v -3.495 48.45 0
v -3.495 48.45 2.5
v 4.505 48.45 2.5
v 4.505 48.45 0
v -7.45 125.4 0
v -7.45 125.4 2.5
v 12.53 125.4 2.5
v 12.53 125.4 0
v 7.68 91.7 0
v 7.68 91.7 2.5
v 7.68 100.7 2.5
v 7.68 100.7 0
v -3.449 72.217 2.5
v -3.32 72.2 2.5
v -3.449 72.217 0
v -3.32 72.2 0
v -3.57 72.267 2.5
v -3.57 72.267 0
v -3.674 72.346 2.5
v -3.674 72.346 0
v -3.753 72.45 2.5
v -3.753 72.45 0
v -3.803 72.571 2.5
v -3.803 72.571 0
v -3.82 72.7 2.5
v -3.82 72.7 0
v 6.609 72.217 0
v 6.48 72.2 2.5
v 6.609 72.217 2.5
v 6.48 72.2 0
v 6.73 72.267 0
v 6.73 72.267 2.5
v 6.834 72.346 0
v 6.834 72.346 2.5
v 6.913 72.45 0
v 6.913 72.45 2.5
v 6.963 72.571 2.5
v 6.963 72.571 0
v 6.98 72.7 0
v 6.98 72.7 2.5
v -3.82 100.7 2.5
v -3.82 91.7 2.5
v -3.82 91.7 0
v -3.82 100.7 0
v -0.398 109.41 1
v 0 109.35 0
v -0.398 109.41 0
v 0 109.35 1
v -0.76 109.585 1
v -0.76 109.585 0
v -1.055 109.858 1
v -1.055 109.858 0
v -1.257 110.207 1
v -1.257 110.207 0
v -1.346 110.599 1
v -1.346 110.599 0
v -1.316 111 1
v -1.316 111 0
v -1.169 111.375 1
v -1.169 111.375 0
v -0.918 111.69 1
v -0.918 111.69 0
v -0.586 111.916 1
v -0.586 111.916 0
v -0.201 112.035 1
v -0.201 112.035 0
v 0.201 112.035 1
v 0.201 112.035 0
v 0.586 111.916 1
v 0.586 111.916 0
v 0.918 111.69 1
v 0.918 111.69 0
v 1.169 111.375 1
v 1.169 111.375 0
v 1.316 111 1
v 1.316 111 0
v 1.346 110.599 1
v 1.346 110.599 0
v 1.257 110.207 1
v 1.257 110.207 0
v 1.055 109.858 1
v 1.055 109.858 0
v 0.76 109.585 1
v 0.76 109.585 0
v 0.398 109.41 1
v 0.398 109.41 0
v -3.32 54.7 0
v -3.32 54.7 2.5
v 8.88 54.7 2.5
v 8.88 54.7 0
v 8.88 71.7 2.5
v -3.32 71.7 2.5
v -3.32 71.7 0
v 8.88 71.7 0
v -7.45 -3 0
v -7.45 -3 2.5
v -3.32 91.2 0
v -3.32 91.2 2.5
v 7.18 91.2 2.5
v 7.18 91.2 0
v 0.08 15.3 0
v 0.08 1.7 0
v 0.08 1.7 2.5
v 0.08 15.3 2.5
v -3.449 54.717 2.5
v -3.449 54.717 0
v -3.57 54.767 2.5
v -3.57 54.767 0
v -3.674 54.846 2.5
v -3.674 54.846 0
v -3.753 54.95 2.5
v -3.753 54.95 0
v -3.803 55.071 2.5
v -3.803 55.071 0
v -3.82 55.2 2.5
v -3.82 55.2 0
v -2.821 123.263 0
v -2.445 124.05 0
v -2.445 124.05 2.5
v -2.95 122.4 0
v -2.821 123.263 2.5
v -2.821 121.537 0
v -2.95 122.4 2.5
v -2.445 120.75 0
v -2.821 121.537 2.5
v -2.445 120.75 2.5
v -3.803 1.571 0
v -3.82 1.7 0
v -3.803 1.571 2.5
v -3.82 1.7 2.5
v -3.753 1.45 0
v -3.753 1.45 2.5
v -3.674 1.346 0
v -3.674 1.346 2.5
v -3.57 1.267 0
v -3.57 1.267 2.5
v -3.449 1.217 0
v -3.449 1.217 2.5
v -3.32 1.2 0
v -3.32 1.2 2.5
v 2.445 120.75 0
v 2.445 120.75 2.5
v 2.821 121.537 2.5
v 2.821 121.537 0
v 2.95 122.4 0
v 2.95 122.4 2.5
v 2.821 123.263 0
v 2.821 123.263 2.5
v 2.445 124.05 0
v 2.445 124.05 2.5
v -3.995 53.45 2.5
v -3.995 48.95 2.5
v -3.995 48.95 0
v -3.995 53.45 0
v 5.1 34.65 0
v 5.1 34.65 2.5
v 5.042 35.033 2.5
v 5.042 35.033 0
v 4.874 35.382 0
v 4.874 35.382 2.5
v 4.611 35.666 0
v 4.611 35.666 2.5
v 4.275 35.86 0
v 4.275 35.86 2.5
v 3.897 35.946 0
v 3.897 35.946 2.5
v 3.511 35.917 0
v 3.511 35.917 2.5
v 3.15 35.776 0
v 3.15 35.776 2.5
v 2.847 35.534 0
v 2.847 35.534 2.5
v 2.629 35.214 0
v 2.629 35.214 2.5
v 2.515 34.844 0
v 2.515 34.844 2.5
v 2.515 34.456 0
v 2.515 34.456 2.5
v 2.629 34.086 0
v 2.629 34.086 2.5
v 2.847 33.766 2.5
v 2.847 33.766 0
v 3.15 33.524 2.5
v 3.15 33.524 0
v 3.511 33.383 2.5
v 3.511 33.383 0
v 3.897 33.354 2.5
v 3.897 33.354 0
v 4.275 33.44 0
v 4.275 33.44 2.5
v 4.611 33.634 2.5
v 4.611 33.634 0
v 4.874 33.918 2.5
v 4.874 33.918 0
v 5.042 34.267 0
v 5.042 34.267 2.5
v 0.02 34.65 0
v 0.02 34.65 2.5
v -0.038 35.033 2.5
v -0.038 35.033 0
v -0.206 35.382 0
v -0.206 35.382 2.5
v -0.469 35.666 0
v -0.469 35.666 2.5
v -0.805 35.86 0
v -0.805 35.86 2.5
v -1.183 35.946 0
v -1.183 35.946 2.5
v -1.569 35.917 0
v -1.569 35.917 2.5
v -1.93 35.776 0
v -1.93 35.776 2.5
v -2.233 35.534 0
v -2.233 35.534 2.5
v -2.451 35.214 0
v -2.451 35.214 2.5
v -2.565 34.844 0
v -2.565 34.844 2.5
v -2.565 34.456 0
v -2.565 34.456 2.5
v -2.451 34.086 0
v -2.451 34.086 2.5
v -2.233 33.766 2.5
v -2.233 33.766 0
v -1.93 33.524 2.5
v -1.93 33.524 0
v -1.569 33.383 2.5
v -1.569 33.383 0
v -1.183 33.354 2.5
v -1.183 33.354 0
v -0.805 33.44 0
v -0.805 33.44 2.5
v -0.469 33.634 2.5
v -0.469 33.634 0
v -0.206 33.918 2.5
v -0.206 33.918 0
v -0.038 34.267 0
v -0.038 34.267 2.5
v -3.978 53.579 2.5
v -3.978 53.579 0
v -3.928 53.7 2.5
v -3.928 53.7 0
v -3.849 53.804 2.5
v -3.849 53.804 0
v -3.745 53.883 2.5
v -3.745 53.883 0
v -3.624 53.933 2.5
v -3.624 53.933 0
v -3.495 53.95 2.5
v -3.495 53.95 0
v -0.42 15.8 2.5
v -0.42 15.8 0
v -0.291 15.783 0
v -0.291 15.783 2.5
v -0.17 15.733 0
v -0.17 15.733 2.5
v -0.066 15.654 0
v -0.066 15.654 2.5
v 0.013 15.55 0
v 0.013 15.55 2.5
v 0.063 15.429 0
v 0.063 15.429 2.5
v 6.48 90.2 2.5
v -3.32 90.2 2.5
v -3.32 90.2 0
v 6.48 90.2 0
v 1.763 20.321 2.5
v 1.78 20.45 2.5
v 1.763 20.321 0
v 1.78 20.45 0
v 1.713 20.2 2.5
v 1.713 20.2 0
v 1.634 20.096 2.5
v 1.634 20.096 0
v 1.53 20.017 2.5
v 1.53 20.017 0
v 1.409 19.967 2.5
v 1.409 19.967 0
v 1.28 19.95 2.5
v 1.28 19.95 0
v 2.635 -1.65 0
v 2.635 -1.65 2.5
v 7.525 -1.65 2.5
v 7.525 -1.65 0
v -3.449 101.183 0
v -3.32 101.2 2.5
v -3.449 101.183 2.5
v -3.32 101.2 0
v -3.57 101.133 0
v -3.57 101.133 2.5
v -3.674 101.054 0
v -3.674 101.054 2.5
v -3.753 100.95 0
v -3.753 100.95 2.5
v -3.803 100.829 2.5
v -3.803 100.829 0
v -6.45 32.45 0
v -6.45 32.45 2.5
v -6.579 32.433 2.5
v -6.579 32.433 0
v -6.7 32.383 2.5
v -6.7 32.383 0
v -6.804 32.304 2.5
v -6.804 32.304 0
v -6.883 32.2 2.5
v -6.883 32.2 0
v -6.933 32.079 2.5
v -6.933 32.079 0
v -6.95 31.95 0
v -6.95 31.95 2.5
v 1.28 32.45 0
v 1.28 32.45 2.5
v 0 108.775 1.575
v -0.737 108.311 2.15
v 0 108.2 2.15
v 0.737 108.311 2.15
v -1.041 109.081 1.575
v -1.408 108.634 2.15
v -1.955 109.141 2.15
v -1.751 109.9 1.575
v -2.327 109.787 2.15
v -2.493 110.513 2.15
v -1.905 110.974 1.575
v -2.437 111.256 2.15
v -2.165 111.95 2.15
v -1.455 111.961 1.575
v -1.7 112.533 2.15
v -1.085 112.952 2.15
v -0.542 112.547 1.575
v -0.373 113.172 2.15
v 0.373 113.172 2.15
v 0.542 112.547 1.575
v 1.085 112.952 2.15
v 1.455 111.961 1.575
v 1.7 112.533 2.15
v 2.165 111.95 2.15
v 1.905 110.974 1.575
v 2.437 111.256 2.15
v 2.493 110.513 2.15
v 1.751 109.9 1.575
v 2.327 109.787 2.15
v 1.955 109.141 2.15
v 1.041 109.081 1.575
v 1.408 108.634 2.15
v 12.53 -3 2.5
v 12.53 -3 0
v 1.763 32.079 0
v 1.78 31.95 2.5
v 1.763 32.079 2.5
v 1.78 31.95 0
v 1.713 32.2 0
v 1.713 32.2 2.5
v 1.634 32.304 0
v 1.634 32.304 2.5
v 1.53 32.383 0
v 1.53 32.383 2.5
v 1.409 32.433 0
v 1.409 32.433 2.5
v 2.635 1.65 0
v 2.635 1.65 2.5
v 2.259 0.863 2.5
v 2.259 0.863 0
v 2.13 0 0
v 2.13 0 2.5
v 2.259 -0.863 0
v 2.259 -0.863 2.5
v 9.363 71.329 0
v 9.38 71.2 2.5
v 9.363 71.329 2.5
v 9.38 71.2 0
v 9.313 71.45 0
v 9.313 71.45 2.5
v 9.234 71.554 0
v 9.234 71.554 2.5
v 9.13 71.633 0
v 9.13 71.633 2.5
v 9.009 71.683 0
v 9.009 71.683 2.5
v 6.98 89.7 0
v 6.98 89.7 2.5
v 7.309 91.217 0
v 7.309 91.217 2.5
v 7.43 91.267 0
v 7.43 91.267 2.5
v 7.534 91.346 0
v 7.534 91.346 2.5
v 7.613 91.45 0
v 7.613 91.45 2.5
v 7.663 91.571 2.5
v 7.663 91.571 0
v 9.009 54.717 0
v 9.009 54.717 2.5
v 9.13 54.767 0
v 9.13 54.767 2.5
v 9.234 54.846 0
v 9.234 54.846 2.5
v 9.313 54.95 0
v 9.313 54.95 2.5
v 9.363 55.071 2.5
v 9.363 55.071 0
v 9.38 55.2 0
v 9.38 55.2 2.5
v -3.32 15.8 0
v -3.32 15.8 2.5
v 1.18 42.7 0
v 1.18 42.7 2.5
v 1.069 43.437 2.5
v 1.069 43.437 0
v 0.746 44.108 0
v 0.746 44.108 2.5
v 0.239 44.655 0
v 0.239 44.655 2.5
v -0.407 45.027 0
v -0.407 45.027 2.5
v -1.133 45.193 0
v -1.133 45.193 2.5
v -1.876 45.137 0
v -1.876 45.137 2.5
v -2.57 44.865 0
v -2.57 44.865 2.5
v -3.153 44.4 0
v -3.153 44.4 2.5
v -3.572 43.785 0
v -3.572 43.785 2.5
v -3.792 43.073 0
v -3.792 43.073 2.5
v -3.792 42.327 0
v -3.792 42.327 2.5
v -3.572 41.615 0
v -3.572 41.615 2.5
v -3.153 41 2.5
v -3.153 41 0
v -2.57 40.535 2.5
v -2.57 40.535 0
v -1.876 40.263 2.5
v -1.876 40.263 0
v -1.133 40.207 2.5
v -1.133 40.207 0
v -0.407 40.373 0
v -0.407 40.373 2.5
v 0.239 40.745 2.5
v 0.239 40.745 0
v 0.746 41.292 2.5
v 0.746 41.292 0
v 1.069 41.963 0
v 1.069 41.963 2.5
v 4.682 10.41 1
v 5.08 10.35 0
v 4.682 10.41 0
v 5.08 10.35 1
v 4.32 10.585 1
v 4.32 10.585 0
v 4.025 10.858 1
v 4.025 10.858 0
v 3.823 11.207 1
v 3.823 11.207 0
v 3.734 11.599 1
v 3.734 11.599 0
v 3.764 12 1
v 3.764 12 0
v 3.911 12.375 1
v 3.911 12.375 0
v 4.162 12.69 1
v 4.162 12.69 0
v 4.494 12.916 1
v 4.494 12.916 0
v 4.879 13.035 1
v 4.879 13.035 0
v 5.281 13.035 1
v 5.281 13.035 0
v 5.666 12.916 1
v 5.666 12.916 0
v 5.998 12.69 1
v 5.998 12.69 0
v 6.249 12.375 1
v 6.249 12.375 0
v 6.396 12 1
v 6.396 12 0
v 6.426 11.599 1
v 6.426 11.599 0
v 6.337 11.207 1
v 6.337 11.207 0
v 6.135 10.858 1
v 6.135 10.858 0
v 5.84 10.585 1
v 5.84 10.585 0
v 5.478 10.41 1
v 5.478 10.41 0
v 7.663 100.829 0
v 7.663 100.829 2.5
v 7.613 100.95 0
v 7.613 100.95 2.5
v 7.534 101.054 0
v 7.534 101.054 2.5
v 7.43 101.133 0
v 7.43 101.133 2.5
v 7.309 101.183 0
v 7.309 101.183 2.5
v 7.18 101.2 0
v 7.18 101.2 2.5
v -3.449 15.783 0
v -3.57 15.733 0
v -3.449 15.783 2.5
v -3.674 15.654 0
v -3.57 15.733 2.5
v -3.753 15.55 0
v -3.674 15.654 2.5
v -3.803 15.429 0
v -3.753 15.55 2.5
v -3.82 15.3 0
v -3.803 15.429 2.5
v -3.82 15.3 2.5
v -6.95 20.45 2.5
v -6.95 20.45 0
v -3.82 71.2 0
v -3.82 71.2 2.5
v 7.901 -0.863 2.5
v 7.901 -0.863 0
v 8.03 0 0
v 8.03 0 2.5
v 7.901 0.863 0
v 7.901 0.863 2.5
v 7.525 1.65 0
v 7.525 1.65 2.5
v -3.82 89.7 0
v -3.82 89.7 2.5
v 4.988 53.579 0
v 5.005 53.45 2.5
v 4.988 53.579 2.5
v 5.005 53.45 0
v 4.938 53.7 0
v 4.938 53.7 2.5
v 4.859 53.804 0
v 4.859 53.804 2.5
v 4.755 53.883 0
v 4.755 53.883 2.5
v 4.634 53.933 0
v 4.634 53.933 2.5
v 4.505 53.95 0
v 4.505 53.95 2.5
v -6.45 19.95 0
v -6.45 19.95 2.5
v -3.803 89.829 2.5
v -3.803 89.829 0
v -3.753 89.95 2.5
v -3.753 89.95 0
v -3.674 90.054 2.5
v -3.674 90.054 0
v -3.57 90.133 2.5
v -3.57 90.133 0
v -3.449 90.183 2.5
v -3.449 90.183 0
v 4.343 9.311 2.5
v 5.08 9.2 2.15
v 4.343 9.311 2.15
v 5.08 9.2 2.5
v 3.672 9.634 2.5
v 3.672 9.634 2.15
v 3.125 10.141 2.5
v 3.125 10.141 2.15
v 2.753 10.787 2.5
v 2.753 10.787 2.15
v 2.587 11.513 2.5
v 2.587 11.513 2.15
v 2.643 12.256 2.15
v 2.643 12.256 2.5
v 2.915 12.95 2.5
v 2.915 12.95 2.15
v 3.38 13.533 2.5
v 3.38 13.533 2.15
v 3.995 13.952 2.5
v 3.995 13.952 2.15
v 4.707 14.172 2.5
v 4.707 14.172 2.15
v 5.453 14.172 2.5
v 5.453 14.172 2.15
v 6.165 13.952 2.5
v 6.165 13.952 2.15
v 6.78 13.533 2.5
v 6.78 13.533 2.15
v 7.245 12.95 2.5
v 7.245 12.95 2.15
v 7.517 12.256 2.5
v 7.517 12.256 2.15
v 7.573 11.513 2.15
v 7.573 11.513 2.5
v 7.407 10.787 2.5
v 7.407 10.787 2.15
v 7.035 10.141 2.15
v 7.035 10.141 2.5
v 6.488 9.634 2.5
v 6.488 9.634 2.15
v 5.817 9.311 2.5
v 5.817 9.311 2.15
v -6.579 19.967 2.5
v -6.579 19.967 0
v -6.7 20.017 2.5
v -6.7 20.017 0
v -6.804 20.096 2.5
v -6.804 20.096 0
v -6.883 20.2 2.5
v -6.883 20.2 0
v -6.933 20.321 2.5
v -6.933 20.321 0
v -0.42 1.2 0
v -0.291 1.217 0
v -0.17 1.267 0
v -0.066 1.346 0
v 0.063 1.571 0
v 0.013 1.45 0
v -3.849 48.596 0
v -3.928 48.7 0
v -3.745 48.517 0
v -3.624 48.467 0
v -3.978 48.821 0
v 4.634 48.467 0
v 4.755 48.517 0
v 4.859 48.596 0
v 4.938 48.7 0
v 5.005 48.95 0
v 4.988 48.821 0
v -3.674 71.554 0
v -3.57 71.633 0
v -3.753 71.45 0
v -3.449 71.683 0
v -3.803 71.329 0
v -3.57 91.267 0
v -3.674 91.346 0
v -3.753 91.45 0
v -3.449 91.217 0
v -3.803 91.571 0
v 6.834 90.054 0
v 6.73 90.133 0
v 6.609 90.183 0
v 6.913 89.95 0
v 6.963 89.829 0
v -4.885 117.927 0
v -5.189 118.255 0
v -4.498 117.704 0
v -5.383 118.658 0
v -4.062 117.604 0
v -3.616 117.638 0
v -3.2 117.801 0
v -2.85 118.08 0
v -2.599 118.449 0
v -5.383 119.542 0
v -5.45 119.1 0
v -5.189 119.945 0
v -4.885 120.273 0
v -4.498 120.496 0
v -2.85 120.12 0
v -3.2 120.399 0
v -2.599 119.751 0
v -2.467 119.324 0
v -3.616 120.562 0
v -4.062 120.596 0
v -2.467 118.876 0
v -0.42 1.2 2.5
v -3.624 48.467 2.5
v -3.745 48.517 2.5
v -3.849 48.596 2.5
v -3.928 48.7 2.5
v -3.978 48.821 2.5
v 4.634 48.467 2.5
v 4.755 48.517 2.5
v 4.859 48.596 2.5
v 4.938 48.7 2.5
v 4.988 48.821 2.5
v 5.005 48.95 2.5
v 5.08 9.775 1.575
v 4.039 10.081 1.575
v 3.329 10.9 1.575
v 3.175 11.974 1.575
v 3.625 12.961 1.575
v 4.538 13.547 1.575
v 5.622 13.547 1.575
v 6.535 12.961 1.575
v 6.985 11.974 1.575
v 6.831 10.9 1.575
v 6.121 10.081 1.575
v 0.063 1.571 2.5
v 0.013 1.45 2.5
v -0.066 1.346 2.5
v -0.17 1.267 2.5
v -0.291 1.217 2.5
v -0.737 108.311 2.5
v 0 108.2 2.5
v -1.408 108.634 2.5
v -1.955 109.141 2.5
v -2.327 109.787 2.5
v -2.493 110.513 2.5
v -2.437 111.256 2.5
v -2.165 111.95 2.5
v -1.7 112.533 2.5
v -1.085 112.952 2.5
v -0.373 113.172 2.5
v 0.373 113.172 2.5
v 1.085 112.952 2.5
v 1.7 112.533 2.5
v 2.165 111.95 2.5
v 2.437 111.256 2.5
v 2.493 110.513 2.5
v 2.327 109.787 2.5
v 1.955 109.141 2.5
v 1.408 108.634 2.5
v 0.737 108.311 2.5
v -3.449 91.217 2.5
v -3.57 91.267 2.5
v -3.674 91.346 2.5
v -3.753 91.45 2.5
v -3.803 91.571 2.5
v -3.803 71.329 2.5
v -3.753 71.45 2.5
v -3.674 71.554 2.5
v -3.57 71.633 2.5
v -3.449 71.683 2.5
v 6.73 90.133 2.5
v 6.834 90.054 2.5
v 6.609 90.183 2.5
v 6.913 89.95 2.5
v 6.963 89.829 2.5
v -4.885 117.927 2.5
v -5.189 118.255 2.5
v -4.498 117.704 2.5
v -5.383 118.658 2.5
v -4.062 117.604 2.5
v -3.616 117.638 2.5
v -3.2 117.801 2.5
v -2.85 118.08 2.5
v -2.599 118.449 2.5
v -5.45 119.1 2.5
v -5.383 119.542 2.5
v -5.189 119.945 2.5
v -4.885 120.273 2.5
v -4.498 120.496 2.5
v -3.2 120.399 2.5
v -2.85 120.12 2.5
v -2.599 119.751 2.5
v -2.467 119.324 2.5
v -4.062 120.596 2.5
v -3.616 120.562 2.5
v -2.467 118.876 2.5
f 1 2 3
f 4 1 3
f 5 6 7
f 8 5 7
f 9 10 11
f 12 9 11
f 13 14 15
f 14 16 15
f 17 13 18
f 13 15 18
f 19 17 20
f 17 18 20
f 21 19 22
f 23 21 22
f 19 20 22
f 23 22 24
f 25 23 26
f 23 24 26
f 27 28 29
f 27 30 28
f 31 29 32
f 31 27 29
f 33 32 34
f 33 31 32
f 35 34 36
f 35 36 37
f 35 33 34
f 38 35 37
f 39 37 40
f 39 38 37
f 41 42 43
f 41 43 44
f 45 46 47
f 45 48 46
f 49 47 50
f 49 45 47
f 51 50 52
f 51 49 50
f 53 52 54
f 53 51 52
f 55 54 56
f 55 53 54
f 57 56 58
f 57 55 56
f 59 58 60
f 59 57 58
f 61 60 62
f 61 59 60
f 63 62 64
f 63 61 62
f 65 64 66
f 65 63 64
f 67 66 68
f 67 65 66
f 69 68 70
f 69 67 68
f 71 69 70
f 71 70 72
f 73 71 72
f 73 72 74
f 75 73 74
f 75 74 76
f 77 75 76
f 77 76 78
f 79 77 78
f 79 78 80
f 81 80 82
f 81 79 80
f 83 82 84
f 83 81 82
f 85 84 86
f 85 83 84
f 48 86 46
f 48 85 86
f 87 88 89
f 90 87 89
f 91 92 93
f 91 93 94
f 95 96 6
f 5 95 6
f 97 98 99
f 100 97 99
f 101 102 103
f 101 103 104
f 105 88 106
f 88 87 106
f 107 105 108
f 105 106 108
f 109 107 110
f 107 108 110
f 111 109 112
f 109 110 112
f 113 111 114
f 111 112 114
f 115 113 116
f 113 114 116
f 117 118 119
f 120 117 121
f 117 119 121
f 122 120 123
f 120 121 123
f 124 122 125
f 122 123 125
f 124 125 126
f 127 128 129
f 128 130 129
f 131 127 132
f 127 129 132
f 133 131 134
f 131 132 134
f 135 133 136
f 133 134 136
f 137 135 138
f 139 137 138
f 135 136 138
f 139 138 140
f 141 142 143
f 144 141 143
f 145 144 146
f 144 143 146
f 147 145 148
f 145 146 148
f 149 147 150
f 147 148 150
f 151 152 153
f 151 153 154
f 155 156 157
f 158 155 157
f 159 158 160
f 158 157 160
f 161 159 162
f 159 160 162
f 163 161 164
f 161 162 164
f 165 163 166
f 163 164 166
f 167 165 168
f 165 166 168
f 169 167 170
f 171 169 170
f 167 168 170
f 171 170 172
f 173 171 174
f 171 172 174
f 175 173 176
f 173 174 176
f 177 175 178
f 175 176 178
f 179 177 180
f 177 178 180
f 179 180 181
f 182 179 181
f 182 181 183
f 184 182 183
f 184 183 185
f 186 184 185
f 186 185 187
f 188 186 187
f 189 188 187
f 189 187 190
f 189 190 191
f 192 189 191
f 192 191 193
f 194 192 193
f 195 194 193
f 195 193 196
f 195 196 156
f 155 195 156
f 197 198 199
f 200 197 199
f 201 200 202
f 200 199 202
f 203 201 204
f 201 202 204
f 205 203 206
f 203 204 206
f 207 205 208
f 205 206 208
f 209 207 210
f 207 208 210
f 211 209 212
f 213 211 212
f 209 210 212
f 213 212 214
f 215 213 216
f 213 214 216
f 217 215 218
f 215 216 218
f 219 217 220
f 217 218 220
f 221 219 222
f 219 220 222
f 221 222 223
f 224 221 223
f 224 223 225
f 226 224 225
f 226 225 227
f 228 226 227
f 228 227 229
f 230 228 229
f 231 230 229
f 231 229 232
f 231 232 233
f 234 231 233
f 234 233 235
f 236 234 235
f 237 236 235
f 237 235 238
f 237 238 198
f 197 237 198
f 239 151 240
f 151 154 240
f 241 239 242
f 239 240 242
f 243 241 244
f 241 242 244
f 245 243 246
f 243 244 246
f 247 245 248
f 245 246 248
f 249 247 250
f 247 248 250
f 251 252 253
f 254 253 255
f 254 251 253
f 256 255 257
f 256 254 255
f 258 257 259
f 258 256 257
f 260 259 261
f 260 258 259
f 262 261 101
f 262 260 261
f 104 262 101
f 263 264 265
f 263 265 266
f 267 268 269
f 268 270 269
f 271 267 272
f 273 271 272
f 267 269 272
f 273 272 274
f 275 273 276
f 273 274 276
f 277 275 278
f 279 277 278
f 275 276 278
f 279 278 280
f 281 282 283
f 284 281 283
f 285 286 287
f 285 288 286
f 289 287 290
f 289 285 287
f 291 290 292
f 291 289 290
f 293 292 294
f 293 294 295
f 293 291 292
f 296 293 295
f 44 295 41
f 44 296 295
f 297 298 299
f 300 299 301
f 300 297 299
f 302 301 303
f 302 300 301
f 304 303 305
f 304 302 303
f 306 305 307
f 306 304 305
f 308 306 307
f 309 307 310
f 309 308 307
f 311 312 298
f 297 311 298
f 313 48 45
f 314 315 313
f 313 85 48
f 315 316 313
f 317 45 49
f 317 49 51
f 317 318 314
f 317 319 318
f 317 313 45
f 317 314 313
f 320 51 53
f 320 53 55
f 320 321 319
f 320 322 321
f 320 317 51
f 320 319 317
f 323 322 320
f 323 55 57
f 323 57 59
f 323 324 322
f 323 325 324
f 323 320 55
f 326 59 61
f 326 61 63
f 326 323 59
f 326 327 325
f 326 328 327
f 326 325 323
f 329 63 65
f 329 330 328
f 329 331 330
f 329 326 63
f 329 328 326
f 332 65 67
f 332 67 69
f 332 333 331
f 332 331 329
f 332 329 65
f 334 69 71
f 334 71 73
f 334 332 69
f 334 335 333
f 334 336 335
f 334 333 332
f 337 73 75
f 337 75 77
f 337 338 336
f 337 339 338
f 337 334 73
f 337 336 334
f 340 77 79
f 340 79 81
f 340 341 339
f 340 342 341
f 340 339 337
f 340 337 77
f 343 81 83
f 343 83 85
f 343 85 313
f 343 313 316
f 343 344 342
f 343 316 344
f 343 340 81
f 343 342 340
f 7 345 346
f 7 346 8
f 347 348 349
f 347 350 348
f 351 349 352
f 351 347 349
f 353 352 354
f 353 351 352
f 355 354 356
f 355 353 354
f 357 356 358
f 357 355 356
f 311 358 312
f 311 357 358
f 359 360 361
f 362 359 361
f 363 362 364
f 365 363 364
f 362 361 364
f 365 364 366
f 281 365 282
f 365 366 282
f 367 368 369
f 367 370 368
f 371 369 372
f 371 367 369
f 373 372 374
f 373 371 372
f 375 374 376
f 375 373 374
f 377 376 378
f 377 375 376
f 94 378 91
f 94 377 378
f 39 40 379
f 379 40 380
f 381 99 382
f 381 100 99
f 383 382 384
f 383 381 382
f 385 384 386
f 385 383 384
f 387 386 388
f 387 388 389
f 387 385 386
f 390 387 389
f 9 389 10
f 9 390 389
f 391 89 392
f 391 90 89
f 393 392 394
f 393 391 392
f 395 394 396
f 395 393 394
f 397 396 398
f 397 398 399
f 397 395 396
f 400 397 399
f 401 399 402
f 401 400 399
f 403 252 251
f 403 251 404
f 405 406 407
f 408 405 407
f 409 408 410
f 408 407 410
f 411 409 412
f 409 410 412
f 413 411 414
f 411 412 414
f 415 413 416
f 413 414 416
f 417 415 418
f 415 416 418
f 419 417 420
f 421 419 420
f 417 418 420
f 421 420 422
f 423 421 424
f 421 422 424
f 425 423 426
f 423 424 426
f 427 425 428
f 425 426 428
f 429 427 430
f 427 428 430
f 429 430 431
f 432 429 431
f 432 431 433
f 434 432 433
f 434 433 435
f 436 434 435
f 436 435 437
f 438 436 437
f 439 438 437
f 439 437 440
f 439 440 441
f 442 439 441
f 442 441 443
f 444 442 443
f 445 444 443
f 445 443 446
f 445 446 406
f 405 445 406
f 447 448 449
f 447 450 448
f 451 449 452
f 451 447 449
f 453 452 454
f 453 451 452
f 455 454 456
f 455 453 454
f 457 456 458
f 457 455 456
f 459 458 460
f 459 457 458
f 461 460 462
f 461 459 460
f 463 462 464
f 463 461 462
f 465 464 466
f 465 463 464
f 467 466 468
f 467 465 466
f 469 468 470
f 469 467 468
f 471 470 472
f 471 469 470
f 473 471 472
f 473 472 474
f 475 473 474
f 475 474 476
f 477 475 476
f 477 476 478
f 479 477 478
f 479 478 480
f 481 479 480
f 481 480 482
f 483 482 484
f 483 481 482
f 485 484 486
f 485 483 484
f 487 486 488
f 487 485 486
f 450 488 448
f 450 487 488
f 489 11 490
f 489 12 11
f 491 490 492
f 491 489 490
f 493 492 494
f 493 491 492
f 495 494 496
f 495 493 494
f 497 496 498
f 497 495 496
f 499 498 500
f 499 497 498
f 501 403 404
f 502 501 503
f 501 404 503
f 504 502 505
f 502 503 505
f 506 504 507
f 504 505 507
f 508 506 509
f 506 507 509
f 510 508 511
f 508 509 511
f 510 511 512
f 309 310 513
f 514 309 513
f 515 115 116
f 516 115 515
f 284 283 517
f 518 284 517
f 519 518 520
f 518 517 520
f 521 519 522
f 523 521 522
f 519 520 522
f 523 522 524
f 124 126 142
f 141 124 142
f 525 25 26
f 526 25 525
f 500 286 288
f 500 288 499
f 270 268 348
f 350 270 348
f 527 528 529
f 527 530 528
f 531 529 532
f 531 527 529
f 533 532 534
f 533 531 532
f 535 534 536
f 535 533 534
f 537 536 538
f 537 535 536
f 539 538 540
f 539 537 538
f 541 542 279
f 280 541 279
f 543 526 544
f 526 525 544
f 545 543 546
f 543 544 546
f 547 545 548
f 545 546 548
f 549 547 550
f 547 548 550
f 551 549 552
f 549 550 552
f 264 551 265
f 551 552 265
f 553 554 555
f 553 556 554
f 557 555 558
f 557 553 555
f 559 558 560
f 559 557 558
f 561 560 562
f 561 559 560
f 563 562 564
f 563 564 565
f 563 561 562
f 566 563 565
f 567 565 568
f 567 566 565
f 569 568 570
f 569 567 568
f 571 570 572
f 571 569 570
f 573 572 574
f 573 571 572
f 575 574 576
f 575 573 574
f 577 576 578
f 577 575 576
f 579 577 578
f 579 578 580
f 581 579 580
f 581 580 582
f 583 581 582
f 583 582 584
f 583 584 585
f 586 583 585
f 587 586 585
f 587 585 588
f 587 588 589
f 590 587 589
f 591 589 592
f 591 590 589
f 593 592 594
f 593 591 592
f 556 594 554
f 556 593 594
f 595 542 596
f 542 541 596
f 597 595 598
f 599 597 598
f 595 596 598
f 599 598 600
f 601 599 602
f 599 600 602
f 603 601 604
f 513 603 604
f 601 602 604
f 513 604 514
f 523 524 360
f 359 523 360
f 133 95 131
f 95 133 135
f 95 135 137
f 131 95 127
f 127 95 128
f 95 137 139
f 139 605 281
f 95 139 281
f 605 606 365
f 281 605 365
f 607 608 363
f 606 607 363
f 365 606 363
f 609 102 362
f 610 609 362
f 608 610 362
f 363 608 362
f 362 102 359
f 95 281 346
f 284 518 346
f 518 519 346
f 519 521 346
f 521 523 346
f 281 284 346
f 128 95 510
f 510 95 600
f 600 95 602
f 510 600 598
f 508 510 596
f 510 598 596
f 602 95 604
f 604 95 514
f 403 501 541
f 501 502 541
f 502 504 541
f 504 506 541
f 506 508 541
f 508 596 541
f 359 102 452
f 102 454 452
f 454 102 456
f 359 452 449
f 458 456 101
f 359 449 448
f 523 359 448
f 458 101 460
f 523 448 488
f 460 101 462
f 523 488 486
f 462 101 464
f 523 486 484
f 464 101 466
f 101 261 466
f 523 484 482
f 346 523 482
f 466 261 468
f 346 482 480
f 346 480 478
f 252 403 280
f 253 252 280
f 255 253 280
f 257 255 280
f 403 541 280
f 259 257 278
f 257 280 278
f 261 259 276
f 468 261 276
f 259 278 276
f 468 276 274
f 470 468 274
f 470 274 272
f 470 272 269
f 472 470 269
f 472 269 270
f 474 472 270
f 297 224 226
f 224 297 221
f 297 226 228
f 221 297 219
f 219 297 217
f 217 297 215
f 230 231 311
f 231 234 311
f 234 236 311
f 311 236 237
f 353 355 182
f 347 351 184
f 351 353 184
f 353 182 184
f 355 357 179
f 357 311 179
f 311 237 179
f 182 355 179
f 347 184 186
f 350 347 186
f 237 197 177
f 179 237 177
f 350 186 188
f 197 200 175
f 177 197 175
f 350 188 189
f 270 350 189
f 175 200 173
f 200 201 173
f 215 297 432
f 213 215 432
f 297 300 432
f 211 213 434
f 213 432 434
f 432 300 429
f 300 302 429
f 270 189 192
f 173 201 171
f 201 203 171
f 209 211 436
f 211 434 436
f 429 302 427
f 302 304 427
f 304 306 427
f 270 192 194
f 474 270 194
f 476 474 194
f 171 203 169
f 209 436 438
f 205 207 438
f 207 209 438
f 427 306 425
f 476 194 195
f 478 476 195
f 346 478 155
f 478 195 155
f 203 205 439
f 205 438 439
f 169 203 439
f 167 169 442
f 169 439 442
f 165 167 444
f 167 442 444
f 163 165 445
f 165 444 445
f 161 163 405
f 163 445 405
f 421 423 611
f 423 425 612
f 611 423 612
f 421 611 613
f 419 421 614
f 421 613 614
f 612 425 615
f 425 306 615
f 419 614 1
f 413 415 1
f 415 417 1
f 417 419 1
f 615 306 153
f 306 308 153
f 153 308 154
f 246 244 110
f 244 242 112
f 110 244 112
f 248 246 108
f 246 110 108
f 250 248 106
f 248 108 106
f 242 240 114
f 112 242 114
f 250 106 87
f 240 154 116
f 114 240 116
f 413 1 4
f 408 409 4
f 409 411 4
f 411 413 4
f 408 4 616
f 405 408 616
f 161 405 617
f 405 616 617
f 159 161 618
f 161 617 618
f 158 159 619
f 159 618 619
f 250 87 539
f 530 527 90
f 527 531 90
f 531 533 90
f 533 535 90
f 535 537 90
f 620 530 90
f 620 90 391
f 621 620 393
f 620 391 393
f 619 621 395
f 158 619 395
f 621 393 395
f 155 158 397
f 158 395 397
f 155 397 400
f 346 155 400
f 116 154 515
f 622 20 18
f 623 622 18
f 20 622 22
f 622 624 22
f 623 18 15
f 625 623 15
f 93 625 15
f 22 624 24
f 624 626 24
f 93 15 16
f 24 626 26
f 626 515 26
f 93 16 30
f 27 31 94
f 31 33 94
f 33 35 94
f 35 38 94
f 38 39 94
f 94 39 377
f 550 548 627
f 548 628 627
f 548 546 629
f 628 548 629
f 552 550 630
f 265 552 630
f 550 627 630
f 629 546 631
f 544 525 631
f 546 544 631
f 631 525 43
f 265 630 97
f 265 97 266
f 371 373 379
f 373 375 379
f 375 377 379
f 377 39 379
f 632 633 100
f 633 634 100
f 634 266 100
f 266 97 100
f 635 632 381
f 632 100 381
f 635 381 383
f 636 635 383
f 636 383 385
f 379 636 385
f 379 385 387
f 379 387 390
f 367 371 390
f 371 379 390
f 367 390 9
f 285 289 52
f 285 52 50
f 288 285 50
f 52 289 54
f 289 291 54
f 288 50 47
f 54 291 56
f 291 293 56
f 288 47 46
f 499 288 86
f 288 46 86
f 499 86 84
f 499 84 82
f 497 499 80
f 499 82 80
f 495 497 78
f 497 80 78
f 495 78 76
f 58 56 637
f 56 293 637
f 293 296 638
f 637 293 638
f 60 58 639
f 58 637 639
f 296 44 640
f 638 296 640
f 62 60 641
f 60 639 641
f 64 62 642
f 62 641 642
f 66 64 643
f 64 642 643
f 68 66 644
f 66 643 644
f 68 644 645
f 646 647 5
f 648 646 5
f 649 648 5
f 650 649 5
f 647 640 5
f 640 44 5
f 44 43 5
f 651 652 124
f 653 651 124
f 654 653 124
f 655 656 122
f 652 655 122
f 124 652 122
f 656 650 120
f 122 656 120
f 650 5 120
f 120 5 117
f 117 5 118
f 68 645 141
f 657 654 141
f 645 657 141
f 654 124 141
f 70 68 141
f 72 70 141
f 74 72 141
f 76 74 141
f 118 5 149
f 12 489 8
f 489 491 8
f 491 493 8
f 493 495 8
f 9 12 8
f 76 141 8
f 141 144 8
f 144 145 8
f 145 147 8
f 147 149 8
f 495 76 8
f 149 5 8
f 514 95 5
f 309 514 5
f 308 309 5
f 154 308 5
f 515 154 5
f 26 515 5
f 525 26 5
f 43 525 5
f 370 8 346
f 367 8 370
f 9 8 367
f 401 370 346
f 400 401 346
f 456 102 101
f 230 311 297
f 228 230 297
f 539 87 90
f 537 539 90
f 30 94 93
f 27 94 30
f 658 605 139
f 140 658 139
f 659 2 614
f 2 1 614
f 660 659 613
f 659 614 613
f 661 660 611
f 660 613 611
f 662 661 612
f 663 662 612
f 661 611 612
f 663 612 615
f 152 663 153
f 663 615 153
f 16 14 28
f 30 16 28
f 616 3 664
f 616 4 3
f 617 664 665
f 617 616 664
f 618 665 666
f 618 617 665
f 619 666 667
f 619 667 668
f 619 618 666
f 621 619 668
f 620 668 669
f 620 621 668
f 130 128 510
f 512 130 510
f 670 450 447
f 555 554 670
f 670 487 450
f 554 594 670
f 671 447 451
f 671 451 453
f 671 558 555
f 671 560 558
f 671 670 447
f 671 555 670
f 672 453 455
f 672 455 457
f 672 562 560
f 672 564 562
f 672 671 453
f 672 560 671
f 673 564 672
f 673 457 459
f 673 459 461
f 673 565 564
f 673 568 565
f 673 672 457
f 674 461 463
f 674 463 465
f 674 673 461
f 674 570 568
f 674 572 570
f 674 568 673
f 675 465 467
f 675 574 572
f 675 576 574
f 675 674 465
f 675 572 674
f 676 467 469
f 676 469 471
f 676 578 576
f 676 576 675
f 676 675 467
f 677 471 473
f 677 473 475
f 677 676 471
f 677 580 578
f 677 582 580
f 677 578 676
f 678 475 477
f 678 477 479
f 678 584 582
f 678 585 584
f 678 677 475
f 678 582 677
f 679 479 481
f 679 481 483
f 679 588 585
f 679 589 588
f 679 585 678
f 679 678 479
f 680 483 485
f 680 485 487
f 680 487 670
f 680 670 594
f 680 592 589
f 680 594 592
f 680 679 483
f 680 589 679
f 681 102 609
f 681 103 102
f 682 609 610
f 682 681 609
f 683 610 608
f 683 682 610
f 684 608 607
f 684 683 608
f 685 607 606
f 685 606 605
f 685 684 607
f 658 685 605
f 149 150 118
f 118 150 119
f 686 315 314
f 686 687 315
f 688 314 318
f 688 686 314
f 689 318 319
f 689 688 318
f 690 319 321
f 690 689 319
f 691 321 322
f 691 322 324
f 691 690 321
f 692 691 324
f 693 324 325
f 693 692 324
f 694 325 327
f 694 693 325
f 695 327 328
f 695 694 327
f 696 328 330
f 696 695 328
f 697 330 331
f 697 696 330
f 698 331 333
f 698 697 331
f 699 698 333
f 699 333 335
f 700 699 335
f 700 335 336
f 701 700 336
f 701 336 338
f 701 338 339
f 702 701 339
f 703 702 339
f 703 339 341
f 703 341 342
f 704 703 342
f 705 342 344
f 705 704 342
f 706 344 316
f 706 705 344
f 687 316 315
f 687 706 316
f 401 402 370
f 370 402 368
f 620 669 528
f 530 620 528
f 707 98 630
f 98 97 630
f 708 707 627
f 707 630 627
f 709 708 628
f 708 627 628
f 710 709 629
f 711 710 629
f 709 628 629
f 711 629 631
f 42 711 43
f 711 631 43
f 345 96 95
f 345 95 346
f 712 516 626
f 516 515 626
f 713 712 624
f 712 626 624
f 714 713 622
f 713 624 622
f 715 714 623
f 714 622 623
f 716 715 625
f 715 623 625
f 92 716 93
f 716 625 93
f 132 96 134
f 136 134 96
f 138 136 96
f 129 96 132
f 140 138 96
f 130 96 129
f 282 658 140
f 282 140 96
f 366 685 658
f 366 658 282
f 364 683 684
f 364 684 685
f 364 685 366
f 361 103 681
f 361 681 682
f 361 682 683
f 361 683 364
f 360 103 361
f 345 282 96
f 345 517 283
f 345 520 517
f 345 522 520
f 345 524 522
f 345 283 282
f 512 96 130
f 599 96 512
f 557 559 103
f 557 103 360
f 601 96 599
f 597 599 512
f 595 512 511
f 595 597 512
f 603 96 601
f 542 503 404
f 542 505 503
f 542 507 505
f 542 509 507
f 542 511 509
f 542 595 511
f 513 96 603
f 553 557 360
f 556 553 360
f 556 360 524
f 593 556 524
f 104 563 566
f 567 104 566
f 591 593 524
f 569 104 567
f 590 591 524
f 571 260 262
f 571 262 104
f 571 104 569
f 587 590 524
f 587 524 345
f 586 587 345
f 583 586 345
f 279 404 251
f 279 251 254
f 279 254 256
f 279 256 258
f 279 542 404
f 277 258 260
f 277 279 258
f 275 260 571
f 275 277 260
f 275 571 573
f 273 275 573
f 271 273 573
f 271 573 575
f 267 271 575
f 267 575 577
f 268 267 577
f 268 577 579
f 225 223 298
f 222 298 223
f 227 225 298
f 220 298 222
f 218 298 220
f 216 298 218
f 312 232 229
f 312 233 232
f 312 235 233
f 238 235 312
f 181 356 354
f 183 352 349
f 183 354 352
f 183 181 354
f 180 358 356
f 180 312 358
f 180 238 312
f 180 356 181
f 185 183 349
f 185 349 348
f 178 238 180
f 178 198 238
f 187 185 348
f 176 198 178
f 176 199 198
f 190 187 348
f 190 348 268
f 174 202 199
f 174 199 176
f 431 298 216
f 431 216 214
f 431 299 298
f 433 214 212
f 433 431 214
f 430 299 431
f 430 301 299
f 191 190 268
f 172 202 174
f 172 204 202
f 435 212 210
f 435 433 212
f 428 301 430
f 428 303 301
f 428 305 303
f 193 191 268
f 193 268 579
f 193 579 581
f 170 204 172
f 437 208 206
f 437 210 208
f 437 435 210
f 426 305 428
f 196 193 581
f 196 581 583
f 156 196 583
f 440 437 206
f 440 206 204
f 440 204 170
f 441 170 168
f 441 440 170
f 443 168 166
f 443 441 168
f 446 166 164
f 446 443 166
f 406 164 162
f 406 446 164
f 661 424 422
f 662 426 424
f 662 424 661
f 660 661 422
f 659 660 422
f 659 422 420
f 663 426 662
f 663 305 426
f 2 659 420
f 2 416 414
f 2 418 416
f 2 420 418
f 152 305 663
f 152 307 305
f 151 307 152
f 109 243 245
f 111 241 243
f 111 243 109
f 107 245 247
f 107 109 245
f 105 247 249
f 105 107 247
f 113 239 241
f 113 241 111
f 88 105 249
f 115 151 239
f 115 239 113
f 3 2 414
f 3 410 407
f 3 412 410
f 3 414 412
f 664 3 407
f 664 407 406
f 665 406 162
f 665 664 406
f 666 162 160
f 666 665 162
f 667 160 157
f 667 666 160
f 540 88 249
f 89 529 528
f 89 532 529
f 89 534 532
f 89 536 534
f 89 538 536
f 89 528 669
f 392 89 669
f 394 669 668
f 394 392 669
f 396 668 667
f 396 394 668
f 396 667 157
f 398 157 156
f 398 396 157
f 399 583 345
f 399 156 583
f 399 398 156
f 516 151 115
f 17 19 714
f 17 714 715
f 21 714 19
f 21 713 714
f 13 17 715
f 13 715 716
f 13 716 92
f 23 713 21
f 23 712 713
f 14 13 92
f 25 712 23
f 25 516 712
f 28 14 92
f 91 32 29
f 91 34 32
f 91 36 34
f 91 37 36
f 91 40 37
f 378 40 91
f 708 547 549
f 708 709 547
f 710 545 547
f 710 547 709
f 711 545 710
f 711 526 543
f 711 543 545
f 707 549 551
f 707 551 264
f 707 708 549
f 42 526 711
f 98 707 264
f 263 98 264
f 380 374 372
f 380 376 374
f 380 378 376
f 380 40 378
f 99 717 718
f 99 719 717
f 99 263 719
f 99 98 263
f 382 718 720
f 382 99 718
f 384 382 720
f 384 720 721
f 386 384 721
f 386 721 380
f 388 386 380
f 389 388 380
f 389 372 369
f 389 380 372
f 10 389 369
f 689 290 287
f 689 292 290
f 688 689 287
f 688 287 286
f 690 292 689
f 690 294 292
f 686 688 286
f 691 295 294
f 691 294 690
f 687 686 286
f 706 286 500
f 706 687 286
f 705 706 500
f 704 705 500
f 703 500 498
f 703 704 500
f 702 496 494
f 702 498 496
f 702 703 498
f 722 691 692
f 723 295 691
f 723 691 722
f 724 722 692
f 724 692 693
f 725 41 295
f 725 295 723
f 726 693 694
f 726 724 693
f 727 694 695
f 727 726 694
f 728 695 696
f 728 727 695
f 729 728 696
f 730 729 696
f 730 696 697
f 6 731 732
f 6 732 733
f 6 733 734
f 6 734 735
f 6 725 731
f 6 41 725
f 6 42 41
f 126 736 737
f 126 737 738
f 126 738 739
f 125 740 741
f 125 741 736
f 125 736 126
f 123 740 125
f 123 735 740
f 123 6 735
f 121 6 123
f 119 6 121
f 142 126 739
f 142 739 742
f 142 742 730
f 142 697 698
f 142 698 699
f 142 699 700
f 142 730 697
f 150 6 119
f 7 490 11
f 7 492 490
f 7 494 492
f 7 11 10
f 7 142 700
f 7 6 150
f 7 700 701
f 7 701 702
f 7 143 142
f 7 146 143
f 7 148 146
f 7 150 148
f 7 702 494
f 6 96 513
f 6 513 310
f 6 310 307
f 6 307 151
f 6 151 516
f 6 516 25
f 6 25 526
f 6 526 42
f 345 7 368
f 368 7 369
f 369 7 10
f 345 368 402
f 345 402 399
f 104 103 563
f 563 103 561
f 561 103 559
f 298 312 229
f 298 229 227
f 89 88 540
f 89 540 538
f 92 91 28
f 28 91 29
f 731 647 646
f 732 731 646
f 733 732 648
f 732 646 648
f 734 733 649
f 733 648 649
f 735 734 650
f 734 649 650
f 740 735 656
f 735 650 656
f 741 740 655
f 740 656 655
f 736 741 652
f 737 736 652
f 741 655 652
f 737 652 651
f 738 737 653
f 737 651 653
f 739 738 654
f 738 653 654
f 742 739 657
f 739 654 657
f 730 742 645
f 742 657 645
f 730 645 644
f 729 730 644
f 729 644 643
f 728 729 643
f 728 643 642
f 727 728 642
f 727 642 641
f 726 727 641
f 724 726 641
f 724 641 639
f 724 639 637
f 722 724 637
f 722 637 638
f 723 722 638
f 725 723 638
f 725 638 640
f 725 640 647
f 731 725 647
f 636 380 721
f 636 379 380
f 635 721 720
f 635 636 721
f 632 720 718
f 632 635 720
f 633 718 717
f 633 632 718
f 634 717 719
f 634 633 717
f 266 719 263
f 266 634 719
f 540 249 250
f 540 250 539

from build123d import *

# Parameters (mm, degrees)
SKETCH1_W                                      = 19.98
SKETCH1_H                                      = 128.4
BOSS_EXTRUDE1_DEPTH                            = 2.5
CUT_EXTRUDE1_DEPTH                             = 127.049239982
CUT_EXTRUDE2_DEPTH                             = 127.049239982
SKETCH4_W                                      = 3.9
SKETCH4_H                                      = 14.6
CUT_EXTRUDE3_DEPTH                             = 127.049239982
F_3_0_3_DIAMETER_HOLE1_D                       = 3
CSK_FOR_M2_5_FLAT_HEAD_MACHINE_SCREW1_AT_COUNT = 2
CSK_FOR_M2_5_FLAT_HEAD_MACHINE_SCREW1_AT_PITCH = 99.130249672
USB_DEPTH                                      = 127.049239982
SKETCH10_R                                     = 1.3
LEDS_DEPTH                                     = 127.049239982
SKETCH11_R                                     = 2.5
RESET_SWITCH_DEPTH                             = 127.049239982
SKETCH13_W                                     = 9
SKETCH13_H                                     = 5.5
DISABLE_COMMS_DEPTH                            = 127.049239982
SKETCH14_W                                     = 13.2
SKETCH14_H                                     = 17
RJ45_DEPTH                                     = 127.049239982
SKETCH15_W                                     = 10.8
SKETCH15_H                                     = 18
OUTPUT_DEPTH                                   = 127.049239982
SKETCH16_W                                     = 11.5
SKETCH16_H                                     = 10
POWER_DEPTH                                    = 127.049239982
FILLETS_R                                      = 0.5


with BuildPart() as part:
    # Sketch1 → Boss-Extrude1 (new body)
    with BuildSketch(Plane.XY.offset(2.5)):
        with Locations((2.54, 61.2)):
            Rectangle(SKETCH1_W, SKETCH1_H)
    extrude(amount=-BOSS_EXTRUDE1_DEPTH)

    # Sketch2 → Cut-Extrude1 (cut, through all)
    with BuildSketch(Plane.XY.offset(2.5)):
        with BuildLine():
            Line((2.445403852, 124.05), (-2.445403852, 124.05))
            ThreePointArc((-2.445403852, 124.05), (-2.95, 122.4), (-2.445403852, 120.75))
            Line((-2.445403852, 120.75), (2.445403852, 120.75))
            ThreePointArc((2.445403852, 120.75), (2.95, 122.4), (2.445403852, 124.05))
        make_face()
    extrude(amount=-CUT_EXTRUDE1_DEPTH, mode=Mode.SUBTRACT)

    # Sketch3 → Cut-Extrude2 (cut, through all)
    with BuildSketch(Plane.XY.offset(2.5)):
        with BuildLine():
            Line((7.525403852, 1.65), (2.634596148, 1.65))
            ThreePointArc((2.634596148, 1.65), (2.13, 0), (2.634596148, -1.65))
            Line((2.634596148, -1.65), (7.525403852, -1.65))
            ThreePointArc((7.525403852, -1.65), (8.03, 0), (7.525403852, 1.65))
        make_face()
    extrude(amount=-CUT_EXTRUDE2_DEPTH, mode=Mode.SUBTRACT)

    # Sketch4 → Cut-Extrude3 (cut, through all)
    with BuildSketch(Plane(origin=(0, 0, 0), x_dir=(-1, 0, 0), z_dir=(0, 0, -1))):
        with Locations((1.87, 8.5)):
            Rectangle(SKETCH4_W, SKETCH4_H)
    extrude(amount=-CUT_EXTRUDE3_DEPTH, mode=Mode.SUBTRACT)

    # Ø3.0 (3) Diameter Hole1 (through all)
    with Locations(Plane.XY.offset(2.5)):
        with Locations((-3.95, 119.1)):
            Hole(F_3_0_3_DIAMETER_HOLE1_D / 2)

    # Sketch7 → CSK for M2.5 Flat Head Machine Screw1 (revolve, cut)
    with BuildSketch(Plane(origin=(5.08, 11.7, 2.5), x_dir=(0, -1, 0), z_dir=(1, 0, 0))):
        Polygon((0, 0), (0, 2.5), (1.35, 2.5), (1.35, 1.5), (2.5, 0.35), (2.5, 0), align=None)
    csk_for_m2_5_flat_head_machine_screw1 = revolve(axis=Axis((5.08, 11.7, 8.85), (0, 0, -1)), mode=Mode.SUBTRACT)

    # CSK for M2.5 Flat Head Machine Screw1 at: CSK for M2.5 Flat Head Machine Screw1 ×2
    with Locations(*[Vector(-0.05124570972853528, 0.9986860754183062, 0) * (i * CSK_FOR_M2_5_FLAT_HEAD_MACHINE_SCREW1_AT_PITCH) for i in range(1, CSK_FOR_M2_5_FLAT_HEAD_MACHINE_SCREW1_AT_COUNT)]):
        add(csk_for_m2_5_flat_head_machine_screw1, mode=Mode.SUBTRACT)

    # Sketch9 → USB (cut, through all)
    with BuildSketch(Plane.XY.offset(2.5)):
        Polygon((-3.82, 19.95), (1.78, 19.95), (1.78, 32.45), (-3.82, 32.45), (-6.95, 32.45), (-6.95, 19.95), align=None)
    extrude(amount=-USB_DEPTH, mode=Mode.SUBTRACT)

    # Sketch10 → LEDs (cut, through all)
    with BuildSketch(Plane.XY.offset(2.5)):
        with Locations((-1.28, 34.65)):
            Circle(SKETCH10_R)
        with Locations((3.8, 34.65)):
            Circle(SKETCH10_R)
    extrude(amount=-LEDS_DEPTH, mode=Mode.SUBTRACT)

    # Sketch11 → Reset switch (cut, through all)
    with BuildSketch(Plane.XY.offset(2.5)):
        with Locations((-1.32, 42.7)):
            Circle(SKETCH11_R)
    extrude(amount=-RESET_SWITCH_DEPTH, mode=Mode.SUBTRACT)

    # Sketch13 → Disable comms (cut, through all)
    with BuildSketch(Plane.XY.offset(2.5)):
        with Locations((0.505, 51.2)):
            Rectangle(SKETCH13_W, SKETCH13_H)
    extrude(amount=-DISABLE_COMMS_DEPTH, mode=Mode.SUBTRACT)

    # Sketch14 → RJ45 (cut, through all)
    with BuildSketch(Plane.XY.offset(2.5)):
        with Locations((2.78, 63.2)):
            Rectangle(SKETCH14_W, SKETCH14_H)
    extrude(amount=-RJ45_DEPTH, mode=Mode.SUBTRACT)

    # Sketch15 → Output (cut, through all)
    with BuildSketch(Plane.XY.offset(2.5)):
        with Locations((1.58, 81.2)):
            Rectangle(SKETCH15_W, SKETCH15_H)
    extrude(amount=-OUTPUT_DEPTH, mode=Mode.SUBTRACT)

    # Sketch16 → Power (cut, through all)
    with BuildSketch(Plane.XY.offset(2.5)):
        with Locations((1.93, 96.2)):
            Rectangle(SKETCH16_W, SKETCH16_H)
    extrude(amount=-POWER_DEPTH, mode=Mode.SUBTRACT)

    # Fillets
    fillets_edges = [part.edges().sort_by_distance(p)[0] for p in [
        (5.005, 53.95, 1.25),
        (5.005, 48.45, 1.25),
        (-3.995, 48.45, 1.25),
        (-3.995, 53.95, 1.25),
        (9.38, 54.7, 1.25),
        (-3.82, 54.7, 1.25),
        (-3.82, 71.7, 1.25),
        (9.38, 71.7, 1.25),
        (6.98, 72.2, 1.25),
        (-3.82, 72.2, 1.25),
        (-3.82, 90.2, 1.25),
        (6.98, 90.2, 1.25),
        (7.68, 91.2, 1.25),
        (-3.82, 91.2, 1.25),
        (-3.82, 101.2, 1.25),
        (7.68, 101.2, 1.25),
        (-3.82, 15.8, 1.25),
        (-3.82, 1.2, 1.25),
        (0.08, 1.2, 1.25),
        (0.08, 15.8, 1.25),
        (-6.95, 19.95, 1.25),
        (-6.95, 32.45, 1.25),
        (1.78, 32.45, 1.25),
        (1.78, 19.95, 1.25),
    ]]
    fillet(fillets_edges, radius=FILLETS_R)


solid = part.part
